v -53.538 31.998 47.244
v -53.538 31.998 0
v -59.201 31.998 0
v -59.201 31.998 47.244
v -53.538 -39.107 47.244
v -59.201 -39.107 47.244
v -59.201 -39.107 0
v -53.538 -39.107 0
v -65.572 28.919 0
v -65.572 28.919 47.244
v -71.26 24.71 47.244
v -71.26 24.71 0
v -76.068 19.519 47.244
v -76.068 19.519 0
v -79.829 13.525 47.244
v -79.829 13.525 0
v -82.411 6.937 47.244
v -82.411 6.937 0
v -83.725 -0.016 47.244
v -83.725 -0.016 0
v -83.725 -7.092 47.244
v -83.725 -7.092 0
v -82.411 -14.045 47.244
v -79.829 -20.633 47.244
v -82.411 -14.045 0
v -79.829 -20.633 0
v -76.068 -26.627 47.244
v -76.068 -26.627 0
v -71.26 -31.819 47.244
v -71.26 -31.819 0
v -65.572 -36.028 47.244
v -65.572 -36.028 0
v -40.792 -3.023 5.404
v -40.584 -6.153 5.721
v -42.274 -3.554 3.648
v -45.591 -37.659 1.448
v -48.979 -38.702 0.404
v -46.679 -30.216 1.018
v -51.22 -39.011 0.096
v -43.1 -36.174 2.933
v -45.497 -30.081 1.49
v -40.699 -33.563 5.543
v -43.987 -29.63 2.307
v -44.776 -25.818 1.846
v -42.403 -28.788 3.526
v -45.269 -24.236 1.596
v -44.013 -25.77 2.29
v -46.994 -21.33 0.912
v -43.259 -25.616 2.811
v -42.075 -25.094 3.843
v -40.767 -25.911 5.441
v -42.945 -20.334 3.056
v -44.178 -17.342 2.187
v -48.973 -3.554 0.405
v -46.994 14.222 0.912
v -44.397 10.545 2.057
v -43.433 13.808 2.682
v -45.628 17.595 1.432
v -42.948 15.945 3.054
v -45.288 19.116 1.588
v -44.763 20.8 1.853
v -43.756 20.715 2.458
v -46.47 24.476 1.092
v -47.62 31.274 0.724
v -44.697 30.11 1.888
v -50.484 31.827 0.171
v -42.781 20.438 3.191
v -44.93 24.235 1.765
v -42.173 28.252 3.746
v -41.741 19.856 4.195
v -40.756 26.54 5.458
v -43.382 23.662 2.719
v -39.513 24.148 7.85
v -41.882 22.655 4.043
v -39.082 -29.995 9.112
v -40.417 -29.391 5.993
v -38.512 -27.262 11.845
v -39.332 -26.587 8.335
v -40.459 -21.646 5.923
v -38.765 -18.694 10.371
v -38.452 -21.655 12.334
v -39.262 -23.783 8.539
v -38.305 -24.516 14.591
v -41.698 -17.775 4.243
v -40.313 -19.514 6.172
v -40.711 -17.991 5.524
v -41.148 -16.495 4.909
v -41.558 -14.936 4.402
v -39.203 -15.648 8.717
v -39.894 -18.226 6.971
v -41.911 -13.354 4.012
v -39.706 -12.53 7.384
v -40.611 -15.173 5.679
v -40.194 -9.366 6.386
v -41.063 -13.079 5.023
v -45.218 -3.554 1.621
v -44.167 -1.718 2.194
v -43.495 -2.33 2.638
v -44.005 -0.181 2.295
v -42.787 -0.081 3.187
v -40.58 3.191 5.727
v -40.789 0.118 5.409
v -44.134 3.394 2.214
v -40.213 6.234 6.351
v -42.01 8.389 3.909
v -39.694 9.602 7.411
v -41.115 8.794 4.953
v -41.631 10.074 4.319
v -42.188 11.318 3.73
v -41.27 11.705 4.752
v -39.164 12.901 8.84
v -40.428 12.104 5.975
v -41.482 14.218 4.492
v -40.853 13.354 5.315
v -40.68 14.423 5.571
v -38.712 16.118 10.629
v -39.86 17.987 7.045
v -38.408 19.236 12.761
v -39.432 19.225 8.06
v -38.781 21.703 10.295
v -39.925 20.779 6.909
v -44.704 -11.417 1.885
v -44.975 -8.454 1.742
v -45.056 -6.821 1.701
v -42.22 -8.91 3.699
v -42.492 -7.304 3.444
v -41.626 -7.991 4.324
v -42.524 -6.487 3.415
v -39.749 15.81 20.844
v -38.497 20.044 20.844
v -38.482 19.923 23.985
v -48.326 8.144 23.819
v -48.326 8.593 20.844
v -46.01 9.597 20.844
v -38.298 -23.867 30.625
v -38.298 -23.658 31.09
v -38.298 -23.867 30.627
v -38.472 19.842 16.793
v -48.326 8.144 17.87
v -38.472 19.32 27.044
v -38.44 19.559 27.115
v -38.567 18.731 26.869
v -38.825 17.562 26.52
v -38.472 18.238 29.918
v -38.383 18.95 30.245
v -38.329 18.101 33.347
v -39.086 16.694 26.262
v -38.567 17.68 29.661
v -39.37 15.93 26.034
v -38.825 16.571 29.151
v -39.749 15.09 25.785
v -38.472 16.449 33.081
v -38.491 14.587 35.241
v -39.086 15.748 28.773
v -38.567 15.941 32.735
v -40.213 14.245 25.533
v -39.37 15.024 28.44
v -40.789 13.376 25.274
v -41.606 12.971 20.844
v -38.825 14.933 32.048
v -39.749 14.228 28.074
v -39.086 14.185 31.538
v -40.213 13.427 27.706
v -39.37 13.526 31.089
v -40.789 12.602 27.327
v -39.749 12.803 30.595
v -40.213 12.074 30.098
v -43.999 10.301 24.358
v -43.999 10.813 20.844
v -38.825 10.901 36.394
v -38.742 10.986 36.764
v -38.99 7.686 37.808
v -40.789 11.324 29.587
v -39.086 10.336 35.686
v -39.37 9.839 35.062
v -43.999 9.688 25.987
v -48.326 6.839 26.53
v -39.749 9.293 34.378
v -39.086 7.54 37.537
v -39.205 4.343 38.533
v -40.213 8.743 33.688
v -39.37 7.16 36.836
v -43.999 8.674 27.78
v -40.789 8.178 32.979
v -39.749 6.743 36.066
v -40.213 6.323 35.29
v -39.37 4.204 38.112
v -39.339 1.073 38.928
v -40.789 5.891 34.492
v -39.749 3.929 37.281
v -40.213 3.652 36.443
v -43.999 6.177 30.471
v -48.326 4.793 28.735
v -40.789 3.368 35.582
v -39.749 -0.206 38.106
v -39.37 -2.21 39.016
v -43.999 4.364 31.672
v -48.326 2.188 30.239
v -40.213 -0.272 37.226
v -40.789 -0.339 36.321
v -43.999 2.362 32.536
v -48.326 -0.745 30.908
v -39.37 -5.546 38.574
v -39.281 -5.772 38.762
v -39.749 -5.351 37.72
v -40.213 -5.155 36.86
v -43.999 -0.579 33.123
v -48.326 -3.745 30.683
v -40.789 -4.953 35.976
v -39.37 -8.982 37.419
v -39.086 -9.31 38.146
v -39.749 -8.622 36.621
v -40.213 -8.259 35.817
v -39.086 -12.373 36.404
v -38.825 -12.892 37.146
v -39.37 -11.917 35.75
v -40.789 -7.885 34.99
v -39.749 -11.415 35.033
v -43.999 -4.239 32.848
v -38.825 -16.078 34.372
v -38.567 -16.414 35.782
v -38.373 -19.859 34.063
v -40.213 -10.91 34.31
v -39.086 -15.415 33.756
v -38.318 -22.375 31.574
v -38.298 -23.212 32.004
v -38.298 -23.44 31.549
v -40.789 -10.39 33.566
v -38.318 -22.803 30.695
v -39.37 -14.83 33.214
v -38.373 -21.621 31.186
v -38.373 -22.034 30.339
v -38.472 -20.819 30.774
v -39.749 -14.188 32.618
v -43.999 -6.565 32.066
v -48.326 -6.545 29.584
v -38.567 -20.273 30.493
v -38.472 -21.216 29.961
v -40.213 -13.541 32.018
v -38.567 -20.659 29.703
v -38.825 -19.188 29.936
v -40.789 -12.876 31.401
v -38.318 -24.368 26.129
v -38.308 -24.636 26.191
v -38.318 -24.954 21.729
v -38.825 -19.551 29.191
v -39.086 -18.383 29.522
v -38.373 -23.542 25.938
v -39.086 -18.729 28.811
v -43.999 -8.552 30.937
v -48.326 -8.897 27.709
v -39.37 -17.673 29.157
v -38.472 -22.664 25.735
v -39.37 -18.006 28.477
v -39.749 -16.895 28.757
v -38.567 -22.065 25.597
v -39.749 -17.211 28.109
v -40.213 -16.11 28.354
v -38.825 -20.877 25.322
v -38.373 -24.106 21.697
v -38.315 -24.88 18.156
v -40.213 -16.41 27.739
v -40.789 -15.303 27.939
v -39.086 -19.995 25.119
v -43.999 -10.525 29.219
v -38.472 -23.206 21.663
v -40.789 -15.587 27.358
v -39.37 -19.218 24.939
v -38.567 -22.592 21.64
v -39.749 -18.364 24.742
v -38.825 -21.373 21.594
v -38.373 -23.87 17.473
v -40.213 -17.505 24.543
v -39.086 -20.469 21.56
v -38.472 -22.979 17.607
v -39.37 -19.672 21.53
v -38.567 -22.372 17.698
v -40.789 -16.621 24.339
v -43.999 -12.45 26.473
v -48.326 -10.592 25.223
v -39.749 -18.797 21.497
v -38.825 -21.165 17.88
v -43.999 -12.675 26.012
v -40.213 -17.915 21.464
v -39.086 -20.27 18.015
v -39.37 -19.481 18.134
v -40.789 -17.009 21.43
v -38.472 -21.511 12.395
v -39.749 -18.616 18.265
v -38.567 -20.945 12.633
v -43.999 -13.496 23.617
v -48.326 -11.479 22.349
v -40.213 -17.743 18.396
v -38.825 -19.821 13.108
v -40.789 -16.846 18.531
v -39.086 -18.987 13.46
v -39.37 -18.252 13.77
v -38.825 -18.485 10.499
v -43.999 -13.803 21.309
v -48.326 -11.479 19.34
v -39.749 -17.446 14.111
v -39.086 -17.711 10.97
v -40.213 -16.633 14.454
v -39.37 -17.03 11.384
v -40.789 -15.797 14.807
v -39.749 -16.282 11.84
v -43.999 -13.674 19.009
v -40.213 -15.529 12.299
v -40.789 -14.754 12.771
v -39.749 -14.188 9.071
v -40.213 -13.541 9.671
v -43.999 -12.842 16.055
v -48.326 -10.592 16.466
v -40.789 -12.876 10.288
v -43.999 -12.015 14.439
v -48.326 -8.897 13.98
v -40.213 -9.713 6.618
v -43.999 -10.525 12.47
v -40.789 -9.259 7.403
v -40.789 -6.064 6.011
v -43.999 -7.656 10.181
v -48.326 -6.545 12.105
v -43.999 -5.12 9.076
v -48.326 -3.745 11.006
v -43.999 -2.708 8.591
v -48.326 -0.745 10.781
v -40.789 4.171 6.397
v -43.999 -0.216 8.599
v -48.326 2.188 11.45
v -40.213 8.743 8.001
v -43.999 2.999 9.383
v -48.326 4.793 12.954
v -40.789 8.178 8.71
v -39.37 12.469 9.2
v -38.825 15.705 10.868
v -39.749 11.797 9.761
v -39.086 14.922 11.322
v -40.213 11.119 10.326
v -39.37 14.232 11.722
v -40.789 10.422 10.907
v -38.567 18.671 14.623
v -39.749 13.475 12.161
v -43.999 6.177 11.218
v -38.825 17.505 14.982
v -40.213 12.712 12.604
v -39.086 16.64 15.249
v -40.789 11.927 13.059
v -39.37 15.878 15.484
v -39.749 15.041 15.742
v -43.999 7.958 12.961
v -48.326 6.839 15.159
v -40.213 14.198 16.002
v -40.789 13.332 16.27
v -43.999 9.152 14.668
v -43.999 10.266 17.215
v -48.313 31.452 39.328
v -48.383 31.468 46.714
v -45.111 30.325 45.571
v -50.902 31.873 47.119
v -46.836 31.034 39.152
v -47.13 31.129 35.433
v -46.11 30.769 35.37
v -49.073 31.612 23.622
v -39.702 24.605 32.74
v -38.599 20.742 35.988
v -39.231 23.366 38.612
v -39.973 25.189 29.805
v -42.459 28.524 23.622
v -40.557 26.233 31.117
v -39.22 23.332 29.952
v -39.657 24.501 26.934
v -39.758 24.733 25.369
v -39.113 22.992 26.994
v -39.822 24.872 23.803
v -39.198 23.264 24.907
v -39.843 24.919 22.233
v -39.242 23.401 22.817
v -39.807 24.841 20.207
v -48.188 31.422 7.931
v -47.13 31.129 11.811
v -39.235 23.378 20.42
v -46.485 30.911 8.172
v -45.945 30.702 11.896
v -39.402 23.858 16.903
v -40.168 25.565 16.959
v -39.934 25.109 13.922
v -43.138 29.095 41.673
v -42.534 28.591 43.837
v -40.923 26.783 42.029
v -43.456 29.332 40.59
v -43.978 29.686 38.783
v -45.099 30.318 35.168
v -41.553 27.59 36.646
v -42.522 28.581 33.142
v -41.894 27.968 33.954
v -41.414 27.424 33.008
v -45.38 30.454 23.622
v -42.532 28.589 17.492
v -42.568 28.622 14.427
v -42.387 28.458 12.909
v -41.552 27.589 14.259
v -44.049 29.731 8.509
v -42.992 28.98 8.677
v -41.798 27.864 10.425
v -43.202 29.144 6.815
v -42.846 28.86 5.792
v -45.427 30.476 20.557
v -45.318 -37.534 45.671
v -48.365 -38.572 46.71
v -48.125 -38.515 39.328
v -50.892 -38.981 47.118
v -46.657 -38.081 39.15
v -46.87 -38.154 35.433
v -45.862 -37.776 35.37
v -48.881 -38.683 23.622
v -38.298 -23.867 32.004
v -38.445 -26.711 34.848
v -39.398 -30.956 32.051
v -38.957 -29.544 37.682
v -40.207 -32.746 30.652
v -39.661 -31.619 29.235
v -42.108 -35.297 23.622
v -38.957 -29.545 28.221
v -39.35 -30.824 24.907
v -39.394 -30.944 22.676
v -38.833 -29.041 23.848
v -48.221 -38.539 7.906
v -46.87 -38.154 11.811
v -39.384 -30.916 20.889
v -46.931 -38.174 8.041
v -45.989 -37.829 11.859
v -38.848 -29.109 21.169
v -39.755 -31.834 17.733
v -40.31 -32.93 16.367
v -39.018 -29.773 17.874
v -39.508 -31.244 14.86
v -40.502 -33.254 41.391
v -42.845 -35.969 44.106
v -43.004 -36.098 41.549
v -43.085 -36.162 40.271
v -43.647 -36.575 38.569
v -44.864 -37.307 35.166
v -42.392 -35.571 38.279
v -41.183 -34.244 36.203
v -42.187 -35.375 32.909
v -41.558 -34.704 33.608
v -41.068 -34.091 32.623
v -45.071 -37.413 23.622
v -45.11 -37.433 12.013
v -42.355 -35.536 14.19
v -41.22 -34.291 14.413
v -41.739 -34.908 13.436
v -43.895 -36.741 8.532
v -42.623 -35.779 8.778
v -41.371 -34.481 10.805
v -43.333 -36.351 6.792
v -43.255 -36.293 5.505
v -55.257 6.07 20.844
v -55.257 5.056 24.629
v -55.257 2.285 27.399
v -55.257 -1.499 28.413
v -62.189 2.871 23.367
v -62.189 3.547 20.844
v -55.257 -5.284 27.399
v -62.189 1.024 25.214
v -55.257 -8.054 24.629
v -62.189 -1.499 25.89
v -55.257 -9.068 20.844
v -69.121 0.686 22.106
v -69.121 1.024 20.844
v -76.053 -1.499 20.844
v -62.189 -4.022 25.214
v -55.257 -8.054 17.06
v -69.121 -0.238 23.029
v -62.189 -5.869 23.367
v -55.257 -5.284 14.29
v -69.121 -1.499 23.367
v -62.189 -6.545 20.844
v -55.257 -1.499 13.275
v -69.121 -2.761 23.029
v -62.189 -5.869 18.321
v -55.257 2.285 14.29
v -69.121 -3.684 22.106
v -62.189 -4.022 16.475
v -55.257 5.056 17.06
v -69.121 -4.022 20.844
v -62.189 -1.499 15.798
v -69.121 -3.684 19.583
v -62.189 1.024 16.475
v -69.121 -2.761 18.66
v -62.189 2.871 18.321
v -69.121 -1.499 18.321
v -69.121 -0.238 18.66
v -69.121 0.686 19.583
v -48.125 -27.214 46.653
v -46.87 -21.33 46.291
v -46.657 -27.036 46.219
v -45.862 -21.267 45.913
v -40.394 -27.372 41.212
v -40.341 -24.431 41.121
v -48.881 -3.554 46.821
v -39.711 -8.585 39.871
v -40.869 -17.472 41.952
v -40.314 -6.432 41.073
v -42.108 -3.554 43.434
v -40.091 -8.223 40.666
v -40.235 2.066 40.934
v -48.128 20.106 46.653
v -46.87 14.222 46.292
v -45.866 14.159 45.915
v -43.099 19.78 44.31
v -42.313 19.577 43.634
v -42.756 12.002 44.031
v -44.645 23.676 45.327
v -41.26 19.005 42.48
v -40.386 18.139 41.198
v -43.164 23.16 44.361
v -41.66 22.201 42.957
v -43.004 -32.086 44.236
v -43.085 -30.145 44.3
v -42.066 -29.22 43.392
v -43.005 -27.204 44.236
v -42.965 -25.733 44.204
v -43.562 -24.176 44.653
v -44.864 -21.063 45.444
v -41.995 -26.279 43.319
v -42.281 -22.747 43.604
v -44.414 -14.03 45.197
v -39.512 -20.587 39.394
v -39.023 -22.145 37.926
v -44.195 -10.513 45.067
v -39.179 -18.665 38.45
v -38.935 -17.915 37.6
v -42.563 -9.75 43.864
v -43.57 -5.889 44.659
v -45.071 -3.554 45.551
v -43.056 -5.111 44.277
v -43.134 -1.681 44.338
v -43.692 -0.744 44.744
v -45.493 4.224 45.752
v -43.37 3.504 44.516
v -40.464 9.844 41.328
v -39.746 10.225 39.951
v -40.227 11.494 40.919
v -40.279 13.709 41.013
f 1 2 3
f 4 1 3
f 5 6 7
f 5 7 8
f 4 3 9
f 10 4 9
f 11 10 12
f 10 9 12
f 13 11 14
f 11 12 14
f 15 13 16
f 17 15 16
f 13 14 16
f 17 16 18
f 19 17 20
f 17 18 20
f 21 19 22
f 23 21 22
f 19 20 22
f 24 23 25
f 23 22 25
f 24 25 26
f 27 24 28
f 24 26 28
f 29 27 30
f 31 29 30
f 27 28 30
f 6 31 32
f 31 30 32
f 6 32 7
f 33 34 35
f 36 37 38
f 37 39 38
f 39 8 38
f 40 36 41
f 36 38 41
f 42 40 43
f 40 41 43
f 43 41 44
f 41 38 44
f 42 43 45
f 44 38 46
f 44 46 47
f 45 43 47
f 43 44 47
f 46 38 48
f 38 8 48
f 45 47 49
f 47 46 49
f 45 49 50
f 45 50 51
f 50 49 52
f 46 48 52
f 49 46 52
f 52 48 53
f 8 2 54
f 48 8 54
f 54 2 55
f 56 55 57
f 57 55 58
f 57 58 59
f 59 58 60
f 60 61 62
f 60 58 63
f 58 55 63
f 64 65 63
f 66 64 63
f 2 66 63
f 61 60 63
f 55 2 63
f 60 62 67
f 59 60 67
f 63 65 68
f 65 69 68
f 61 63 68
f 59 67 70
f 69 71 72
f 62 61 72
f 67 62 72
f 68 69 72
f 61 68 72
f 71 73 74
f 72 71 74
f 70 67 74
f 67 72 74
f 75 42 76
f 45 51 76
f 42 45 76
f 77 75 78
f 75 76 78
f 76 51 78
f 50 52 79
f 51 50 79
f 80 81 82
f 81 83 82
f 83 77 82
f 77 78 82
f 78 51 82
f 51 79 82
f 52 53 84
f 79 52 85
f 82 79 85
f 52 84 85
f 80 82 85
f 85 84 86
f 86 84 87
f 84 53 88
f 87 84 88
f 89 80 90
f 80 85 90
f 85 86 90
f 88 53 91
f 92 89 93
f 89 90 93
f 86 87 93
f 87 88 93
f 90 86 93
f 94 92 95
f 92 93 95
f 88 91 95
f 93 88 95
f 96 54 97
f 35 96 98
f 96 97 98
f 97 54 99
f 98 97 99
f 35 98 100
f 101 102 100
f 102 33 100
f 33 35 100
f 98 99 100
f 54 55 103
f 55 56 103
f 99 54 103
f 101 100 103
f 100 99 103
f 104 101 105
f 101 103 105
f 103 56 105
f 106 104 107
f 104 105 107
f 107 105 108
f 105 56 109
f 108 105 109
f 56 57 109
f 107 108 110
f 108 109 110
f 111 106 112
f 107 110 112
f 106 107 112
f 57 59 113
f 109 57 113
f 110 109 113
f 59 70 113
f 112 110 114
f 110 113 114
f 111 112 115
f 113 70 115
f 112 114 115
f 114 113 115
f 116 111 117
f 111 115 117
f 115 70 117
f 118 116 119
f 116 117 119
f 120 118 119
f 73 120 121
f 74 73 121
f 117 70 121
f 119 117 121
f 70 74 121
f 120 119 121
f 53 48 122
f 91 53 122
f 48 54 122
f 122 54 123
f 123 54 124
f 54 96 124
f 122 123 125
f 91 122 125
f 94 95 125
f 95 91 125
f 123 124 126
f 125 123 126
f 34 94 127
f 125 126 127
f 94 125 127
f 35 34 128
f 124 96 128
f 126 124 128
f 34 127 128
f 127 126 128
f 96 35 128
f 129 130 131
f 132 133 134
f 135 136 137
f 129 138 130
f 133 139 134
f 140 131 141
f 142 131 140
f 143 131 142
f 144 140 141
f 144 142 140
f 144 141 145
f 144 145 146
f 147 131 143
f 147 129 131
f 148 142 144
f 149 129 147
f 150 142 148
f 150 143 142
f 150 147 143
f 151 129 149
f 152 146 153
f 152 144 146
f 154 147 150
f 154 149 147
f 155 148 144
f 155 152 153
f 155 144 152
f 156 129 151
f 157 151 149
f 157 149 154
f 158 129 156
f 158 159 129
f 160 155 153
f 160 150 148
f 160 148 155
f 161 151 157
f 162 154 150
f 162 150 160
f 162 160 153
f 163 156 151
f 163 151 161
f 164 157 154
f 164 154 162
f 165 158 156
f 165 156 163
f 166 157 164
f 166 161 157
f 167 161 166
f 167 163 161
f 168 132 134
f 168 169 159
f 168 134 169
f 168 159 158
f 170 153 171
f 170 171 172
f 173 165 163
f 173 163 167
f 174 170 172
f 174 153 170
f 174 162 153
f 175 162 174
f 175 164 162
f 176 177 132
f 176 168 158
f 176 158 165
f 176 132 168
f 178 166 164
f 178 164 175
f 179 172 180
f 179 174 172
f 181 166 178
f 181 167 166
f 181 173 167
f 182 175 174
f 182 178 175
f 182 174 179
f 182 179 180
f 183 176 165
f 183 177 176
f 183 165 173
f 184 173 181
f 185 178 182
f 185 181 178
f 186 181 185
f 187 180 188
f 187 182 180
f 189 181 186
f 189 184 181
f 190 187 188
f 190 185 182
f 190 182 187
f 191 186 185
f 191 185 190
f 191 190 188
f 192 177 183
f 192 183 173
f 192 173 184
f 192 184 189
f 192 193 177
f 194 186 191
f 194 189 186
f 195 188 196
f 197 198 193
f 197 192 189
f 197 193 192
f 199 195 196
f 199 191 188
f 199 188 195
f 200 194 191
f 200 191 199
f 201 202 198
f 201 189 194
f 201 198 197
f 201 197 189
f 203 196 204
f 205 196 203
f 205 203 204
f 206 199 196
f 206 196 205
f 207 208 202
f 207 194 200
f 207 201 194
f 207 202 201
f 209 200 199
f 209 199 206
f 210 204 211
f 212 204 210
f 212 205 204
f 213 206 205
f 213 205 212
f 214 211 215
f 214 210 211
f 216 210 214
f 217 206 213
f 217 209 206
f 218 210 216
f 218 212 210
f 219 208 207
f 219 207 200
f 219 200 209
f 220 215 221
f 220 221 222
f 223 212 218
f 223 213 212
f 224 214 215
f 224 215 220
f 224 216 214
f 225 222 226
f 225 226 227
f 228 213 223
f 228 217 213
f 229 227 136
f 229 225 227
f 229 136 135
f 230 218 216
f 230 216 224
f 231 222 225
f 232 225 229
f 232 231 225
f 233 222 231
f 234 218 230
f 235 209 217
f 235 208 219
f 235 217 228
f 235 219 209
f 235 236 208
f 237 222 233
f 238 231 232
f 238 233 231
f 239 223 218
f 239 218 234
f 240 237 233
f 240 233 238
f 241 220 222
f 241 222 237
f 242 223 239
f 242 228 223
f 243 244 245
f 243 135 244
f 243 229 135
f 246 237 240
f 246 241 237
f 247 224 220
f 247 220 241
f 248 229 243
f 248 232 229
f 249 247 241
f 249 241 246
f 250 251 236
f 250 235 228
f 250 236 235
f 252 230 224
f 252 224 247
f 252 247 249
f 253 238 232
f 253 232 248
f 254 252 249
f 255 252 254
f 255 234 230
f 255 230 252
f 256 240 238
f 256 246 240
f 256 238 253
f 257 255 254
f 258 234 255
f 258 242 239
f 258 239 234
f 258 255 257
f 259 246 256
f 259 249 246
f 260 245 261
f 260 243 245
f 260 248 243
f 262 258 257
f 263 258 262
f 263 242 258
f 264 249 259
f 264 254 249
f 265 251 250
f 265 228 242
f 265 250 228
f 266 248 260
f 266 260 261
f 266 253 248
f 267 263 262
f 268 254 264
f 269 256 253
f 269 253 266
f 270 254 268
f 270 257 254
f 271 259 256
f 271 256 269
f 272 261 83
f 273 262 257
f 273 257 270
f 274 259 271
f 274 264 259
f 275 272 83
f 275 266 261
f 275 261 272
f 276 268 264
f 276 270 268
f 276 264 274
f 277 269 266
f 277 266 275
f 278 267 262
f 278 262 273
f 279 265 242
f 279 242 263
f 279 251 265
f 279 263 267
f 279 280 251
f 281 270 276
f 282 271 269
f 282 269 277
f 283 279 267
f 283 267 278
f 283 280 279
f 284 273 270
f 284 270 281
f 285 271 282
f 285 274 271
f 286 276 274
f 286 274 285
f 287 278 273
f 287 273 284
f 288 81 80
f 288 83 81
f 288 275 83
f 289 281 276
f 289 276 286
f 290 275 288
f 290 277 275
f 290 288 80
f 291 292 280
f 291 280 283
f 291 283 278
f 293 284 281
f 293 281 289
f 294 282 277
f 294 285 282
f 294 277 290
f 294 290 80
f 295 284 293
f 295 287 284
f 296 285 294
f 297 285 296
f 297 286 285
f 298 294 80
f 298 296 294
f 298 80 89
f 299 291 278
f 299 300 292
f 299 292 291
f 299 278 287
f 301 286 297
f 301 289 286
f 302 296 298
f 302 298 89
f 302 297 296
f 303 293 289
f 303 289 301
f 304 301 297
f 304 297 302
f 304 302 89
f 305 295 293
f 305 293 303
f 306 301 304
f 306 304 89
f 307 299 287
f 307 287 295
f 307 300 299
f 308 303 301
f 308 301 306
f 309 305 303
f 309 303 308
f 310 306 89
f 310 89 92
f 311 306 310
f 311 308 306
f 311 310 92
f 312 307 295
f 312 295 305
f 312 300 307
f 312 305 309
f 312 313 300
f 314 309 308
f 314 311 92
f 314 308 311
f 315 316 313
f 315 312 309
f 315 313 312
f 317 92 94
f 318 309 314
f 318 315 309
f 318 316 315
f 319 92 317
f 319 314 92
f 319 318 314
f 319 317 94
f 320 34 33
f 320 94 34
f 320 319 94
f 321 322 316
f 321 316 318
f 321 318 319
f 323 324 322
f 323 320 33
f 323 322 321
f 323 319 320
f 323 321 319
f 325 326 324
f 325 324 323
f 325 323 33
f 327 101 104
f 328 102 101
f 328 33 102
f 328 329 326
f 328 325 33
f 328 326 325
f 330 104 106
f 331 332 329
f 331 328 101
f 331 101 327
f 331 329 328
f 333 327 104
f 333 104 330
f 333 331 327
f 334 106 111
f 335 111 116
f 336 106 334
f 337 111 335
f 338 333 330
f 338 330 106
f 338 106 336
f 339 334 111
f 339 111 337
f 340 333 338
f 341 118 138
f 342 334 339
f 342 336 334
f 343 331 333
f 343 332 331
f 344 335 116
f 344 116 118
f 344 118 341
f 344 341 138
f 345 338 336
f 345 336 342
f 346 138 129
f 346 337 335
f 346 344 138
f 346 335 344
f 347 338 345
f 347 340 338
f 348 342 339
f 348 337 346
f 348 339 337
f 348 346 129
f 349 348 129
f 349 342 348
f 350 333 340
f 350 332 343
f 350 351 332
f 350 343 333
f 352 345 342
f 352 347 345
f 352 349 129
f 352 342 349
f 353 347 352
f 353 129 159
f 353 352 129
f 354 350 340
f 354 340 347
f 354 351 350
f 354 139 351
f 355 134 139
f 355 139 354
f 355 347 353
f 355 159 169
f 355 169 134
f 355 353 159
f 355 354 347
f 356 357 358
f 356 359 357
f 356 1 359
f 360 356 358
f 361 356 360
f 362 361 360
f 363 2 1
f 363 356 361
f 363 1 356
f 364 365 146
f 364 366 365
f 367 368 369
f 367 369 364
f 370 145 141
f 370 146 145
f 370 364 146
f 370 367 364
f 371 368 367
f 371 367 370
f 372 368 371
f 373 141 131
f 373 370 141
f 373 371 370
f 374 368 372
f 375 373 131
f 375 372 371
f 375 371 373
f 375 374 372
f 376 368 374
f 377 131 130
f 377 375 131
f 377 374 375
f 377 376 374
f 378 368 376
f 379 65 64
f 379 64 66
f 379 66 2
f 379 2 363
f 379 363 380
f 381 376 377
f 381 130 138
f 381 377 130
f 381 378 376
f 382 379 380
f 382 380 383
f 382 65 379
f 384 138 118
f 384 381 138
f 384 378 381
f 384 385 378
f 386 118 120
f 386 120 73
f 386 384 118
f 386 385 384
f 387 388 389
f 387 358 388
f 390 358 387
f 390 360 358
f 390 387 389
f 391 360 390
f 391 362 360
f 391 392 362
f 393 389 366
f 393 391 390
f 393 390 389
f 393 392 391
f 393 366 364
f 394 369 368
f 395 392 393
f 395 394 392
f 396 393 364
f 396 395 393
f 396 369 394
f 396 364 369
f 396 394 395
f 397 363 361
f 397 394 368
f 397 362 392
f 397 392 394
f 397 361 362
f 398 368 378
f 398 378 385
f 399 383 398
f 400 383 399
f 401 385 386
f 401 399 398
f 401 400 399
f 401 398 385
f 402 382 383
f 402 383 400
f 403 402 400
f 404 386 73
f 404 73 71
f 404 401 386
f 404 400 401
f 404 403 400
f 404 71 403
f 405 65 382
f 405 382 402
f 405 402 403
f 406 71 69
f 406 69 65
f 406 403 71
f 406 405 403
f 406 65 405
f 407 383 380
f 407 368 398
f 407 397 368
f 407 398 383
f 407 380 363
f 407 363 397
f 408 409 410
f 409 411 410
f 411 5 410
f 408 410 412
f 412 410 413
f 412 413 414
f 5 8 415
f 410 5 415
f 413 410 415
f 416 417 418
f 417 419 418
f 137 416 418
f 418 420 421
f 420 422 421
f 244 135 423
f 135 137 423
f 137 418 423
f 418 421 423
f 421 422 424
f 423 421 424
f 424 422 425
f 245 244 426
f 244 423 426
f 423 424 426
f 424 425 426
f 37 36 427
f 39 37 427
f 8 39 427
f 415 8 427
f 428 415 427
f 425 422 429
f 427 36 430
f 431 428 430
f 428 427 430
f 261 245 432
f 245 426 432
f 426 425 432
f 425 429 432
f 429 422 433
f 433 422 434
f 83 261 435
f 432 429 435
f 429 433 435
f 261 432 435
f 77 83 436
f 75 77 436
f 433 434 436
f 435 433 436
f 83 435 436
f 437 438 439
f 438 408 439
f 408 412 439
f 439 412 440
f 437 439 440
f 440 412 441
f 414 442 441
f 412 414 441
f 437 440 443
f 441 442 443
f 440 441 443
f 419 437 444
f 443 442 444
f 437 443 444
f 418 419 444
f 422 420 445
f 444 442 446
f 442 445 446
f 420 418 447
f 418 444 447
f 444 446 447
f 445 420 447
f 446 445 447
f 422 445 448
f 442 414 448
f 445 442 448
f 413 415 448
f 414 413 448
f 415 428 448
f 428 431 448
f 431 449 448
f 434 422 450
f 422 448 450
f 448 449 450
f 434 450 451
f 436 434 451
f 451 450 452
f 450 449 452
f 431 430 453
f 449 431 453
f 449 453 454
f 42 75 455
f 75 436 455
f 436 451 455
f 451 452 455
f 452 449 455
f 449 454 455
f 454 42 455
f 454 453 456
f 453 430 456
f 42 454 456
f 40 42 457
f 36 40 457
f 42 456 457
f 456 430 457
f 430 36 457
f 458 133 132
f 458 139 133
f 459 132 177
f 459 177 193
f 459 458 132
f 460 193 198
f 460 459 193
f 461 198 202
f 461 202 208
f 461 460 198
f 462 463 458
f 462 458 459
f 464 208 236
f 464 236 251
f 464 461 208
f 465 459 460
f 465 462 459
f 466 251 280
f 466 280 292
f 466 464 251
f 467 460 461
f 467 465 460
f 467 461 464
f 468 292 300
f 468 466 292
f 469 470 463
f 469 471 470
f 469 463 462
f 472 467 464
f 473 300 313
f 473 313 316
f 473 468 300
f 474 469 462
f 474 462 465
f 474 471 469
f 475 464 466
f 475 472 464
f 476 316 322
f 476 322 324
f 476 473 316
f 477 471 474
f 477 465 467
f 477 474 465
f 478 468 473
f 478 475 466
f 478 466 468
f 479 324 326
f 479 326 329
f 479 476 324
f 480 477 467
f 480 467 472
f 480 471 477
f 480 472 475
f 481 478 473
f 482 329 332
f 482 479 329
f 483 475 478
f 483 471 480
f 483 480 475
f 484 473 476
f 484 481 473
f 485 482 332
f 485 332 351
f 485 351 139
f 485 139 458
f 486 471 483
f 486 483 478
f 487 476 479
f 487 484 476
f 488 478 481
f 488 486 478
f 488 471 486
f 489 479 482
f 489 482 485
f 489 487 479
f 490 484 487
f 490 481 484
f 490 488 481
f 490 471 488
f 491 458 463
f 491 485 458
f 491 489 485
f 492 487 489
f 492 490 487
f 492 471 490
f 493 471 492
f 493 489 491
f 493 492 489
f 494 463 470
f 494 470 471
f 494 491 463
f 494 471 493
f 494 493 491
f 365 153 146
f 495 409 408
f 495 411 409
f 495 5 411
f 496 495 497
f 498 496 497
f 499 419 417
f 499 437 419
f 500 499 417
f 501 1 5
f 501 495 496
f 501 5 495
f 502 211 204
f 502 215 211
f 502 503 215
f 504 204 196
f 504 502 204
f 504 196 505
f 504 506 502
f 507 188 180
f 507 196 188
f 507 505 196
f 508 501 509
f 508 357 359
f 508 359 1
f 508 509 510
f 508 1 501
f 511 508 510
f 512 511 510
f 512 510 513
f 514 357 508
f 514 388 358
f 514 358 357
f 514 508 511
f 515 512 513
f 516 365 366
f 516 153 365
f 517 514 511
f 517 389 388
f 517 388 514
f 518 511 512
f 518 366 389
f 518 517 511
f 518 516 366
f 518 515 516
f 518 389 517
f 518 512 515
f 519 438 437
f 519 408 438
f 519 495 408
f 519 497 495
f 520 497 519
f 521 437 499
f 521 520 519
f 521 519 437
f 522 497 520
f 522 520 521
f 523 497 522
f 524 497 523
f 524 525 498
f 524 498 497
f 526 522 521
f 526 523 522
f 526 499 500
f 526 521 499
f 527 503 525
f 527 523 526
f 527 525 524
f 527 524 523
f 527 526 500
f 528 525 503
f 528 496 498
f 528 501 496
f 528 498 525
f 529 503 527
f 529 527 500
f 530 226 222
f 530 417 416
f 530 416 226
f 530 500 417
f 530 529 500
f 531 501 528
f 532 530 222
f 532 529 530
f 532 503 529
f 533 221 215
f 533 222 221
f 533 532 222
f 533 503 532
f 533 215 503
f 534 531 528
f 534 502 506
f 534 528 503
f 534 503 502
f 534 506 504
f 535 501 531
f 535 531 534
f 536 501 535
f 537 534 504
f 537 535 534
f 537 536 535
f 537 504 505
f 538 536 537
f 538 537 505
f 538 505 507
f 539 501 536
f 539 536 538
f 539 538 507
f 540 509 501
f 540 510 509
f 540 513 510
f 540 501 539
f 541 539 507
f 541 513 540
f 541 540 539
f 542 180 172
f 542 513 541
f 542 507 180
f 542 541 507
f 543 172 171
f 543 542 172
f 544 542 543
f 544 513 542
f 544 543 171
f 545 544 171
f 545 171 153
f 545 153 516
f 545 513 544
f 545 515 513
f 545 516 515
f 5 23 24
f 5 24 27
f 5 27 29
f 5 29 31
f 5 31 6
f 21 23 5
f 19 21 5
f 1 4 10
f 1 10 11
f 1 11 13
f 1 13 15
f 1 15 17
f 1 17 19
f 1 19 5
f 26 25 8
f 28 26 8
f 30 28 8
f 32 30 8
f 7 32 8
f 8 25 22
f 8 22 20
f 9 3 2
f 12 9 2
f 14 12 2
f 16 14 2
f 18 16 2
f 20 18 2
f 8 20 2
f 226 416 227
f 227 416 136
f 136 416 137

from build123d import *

# Parameters (mm, degrees)
F1_DEPTH    = 47.244
F2_R        = 13.7417577373
F4_T1_DEPTH = 123.444
F4_T3_DEPTH = 147.3045786738


# Not quite as in the source:
# - a fillet or chamfer that OpenCascade refuses, or shapes differently, is made with other operations: its cross-section is extruded or revolved along the edge and cut away or added
# - an extrude whose draft closes it to a point is written as a loft to that point


with BuildPart() as f1:
    # F0 (on Top) → F1 (new body)
    with BuildSketch(Plane.XY):
        with BuildLine():
            Line((-38.2979549468, 31.997974962), (-59.2006028914, 31.997974962))
            ThreePointArc((-59.2006028914, 31.997974962), (-83.8900545196, -3.5543143749), (-59.2006028914, -39.1066037118))
            Line((-59.2006028914, -39.1066037118), (-38.2979549468, -39.1066037118))
            Line((-38.2979549468, -39.1066037118), (-38.2979549468, 31.997974962))
        make_face()
    extrude(amount=F1_DEPTH)

    # F2 (on face) → F3 section 0
    with BuildSketch(Plane.YZ.offset(-38.2979549468), mode=Mode.PRIVATE) as f3_s0:
        with Locations((-1.4992692741, 20.8444874734)):
            Circle(F2_R)
    loft([f3_s0.sketch, Vertex(-76.0531240335, -1.4992692741, 20.8444874734)], ruled=True, mode=Mode.SUBTRACT)

    # F4: fillet of radius 15.24 on 5 edges, made by hand

    # F4_s2 → F4_t1 (cut)
    with BuildSketch(Plane.XY.offset(-38.1)):
        with BuildLine():
            add(Edge.make_bspline(
                [(-53.5379549468, -39.1066037118), (-38.2979549468, -39.1066037118), (-38.2979549468, -23.8666037118)],
                knots=[0, 0, 0, 1, 1, 1], degree=2, weights=[1, 1, 1]))
            Line((-38.2979549468, -23.8666037118), (-38.2979549468, -39.1066037118))
            Line((-38.2979549468, -39.1066037118), (-53.5379549468, -39.1066037118))
        make_face()
        with BuildLine():
            add(Edge.make_bspline(
                [(-53.5379549468, 31.997974962), (-38.2979549468, 31.997974962), (-38.2979549468, 16.757974962)],
                knots=[0, 0, 0, 1, 1, 1], degree=2, weights=[1, 1, 1]))
            Line((-38.2979549468, 16.757974962), (-38.2979549468, 31.997974962))
            Line((-38.2979549468, 31.997974962), (-53.5379549468, 31.997974962))
        make_face()
    extrude(amount=F4_T1_DEPTH, mode=Mode.SUBTRACT)

    # F4_s4 → F4_t3 (cut)
    with BuildSketch(Plane.XZ.offset(-70.097974962)):
        with BuildLine():
            add(Edge.make_bspline(
                [(-53.5379549468, 0), (-38.2979549468, 0), (-38.2979549468, 15.24)],
                knots=[0, 0, 0, 1, 1, 1], degree=2, weights=[1, 1, 1]))
            Line((-38.2979549468, 15.24), (-38.2979549468, 0))
            Line((-38.2979549468, 0), (-53.5379549468, 0))
        make_face()
        with BuildLine():
            add(Edge.make_bspline(
                [(-53.5379549468, 47.244), (-38.2979549468, 47.244), (-38.2979549468, 32.004)],
                knots=[0, 0, 0, 1, 1, 1], degree=2, weights=[1, 1, 1]))
            Line((-38.2979549468, 32.004), (-38.2979549468, 47.244))
            Line((-38.2979549468, 47.244), (-53.5379549468, 47.244))
        make_face()
    extrude(amount=F4_T3_DEPTH, mode=Mode.SUBTRACT)

    # F4_s5 → F4_t6 (revolve, cut)
    with BuildSketch(Plane.XY.offset(20.8444874734)):
        with BuildLine():
            add(Edge.make_bspline(
                [(-38.2979549468, 22.9136513455), (-38.2979549468, 12.2424884632), (-48.3255679625, 8.5927358047)],
                knots=[0, 0, 0, 1, 1, 1], degree=2, weights=[1, 1, 1]))
            Line((-48.3255679625, 8.5927358047), (-38.2979549468, 12.2424884632))
            Line((-38.2979549468, 12.2424884632), (-38.2979549468, 22.9136513455))
        make_face()
    revolve(axis=Axis((-38.2979549468, -1.4992692741, 20.8444874734), (1, 0, 0)), mode=Mode.SUBTRACT)


solid = f1.part
